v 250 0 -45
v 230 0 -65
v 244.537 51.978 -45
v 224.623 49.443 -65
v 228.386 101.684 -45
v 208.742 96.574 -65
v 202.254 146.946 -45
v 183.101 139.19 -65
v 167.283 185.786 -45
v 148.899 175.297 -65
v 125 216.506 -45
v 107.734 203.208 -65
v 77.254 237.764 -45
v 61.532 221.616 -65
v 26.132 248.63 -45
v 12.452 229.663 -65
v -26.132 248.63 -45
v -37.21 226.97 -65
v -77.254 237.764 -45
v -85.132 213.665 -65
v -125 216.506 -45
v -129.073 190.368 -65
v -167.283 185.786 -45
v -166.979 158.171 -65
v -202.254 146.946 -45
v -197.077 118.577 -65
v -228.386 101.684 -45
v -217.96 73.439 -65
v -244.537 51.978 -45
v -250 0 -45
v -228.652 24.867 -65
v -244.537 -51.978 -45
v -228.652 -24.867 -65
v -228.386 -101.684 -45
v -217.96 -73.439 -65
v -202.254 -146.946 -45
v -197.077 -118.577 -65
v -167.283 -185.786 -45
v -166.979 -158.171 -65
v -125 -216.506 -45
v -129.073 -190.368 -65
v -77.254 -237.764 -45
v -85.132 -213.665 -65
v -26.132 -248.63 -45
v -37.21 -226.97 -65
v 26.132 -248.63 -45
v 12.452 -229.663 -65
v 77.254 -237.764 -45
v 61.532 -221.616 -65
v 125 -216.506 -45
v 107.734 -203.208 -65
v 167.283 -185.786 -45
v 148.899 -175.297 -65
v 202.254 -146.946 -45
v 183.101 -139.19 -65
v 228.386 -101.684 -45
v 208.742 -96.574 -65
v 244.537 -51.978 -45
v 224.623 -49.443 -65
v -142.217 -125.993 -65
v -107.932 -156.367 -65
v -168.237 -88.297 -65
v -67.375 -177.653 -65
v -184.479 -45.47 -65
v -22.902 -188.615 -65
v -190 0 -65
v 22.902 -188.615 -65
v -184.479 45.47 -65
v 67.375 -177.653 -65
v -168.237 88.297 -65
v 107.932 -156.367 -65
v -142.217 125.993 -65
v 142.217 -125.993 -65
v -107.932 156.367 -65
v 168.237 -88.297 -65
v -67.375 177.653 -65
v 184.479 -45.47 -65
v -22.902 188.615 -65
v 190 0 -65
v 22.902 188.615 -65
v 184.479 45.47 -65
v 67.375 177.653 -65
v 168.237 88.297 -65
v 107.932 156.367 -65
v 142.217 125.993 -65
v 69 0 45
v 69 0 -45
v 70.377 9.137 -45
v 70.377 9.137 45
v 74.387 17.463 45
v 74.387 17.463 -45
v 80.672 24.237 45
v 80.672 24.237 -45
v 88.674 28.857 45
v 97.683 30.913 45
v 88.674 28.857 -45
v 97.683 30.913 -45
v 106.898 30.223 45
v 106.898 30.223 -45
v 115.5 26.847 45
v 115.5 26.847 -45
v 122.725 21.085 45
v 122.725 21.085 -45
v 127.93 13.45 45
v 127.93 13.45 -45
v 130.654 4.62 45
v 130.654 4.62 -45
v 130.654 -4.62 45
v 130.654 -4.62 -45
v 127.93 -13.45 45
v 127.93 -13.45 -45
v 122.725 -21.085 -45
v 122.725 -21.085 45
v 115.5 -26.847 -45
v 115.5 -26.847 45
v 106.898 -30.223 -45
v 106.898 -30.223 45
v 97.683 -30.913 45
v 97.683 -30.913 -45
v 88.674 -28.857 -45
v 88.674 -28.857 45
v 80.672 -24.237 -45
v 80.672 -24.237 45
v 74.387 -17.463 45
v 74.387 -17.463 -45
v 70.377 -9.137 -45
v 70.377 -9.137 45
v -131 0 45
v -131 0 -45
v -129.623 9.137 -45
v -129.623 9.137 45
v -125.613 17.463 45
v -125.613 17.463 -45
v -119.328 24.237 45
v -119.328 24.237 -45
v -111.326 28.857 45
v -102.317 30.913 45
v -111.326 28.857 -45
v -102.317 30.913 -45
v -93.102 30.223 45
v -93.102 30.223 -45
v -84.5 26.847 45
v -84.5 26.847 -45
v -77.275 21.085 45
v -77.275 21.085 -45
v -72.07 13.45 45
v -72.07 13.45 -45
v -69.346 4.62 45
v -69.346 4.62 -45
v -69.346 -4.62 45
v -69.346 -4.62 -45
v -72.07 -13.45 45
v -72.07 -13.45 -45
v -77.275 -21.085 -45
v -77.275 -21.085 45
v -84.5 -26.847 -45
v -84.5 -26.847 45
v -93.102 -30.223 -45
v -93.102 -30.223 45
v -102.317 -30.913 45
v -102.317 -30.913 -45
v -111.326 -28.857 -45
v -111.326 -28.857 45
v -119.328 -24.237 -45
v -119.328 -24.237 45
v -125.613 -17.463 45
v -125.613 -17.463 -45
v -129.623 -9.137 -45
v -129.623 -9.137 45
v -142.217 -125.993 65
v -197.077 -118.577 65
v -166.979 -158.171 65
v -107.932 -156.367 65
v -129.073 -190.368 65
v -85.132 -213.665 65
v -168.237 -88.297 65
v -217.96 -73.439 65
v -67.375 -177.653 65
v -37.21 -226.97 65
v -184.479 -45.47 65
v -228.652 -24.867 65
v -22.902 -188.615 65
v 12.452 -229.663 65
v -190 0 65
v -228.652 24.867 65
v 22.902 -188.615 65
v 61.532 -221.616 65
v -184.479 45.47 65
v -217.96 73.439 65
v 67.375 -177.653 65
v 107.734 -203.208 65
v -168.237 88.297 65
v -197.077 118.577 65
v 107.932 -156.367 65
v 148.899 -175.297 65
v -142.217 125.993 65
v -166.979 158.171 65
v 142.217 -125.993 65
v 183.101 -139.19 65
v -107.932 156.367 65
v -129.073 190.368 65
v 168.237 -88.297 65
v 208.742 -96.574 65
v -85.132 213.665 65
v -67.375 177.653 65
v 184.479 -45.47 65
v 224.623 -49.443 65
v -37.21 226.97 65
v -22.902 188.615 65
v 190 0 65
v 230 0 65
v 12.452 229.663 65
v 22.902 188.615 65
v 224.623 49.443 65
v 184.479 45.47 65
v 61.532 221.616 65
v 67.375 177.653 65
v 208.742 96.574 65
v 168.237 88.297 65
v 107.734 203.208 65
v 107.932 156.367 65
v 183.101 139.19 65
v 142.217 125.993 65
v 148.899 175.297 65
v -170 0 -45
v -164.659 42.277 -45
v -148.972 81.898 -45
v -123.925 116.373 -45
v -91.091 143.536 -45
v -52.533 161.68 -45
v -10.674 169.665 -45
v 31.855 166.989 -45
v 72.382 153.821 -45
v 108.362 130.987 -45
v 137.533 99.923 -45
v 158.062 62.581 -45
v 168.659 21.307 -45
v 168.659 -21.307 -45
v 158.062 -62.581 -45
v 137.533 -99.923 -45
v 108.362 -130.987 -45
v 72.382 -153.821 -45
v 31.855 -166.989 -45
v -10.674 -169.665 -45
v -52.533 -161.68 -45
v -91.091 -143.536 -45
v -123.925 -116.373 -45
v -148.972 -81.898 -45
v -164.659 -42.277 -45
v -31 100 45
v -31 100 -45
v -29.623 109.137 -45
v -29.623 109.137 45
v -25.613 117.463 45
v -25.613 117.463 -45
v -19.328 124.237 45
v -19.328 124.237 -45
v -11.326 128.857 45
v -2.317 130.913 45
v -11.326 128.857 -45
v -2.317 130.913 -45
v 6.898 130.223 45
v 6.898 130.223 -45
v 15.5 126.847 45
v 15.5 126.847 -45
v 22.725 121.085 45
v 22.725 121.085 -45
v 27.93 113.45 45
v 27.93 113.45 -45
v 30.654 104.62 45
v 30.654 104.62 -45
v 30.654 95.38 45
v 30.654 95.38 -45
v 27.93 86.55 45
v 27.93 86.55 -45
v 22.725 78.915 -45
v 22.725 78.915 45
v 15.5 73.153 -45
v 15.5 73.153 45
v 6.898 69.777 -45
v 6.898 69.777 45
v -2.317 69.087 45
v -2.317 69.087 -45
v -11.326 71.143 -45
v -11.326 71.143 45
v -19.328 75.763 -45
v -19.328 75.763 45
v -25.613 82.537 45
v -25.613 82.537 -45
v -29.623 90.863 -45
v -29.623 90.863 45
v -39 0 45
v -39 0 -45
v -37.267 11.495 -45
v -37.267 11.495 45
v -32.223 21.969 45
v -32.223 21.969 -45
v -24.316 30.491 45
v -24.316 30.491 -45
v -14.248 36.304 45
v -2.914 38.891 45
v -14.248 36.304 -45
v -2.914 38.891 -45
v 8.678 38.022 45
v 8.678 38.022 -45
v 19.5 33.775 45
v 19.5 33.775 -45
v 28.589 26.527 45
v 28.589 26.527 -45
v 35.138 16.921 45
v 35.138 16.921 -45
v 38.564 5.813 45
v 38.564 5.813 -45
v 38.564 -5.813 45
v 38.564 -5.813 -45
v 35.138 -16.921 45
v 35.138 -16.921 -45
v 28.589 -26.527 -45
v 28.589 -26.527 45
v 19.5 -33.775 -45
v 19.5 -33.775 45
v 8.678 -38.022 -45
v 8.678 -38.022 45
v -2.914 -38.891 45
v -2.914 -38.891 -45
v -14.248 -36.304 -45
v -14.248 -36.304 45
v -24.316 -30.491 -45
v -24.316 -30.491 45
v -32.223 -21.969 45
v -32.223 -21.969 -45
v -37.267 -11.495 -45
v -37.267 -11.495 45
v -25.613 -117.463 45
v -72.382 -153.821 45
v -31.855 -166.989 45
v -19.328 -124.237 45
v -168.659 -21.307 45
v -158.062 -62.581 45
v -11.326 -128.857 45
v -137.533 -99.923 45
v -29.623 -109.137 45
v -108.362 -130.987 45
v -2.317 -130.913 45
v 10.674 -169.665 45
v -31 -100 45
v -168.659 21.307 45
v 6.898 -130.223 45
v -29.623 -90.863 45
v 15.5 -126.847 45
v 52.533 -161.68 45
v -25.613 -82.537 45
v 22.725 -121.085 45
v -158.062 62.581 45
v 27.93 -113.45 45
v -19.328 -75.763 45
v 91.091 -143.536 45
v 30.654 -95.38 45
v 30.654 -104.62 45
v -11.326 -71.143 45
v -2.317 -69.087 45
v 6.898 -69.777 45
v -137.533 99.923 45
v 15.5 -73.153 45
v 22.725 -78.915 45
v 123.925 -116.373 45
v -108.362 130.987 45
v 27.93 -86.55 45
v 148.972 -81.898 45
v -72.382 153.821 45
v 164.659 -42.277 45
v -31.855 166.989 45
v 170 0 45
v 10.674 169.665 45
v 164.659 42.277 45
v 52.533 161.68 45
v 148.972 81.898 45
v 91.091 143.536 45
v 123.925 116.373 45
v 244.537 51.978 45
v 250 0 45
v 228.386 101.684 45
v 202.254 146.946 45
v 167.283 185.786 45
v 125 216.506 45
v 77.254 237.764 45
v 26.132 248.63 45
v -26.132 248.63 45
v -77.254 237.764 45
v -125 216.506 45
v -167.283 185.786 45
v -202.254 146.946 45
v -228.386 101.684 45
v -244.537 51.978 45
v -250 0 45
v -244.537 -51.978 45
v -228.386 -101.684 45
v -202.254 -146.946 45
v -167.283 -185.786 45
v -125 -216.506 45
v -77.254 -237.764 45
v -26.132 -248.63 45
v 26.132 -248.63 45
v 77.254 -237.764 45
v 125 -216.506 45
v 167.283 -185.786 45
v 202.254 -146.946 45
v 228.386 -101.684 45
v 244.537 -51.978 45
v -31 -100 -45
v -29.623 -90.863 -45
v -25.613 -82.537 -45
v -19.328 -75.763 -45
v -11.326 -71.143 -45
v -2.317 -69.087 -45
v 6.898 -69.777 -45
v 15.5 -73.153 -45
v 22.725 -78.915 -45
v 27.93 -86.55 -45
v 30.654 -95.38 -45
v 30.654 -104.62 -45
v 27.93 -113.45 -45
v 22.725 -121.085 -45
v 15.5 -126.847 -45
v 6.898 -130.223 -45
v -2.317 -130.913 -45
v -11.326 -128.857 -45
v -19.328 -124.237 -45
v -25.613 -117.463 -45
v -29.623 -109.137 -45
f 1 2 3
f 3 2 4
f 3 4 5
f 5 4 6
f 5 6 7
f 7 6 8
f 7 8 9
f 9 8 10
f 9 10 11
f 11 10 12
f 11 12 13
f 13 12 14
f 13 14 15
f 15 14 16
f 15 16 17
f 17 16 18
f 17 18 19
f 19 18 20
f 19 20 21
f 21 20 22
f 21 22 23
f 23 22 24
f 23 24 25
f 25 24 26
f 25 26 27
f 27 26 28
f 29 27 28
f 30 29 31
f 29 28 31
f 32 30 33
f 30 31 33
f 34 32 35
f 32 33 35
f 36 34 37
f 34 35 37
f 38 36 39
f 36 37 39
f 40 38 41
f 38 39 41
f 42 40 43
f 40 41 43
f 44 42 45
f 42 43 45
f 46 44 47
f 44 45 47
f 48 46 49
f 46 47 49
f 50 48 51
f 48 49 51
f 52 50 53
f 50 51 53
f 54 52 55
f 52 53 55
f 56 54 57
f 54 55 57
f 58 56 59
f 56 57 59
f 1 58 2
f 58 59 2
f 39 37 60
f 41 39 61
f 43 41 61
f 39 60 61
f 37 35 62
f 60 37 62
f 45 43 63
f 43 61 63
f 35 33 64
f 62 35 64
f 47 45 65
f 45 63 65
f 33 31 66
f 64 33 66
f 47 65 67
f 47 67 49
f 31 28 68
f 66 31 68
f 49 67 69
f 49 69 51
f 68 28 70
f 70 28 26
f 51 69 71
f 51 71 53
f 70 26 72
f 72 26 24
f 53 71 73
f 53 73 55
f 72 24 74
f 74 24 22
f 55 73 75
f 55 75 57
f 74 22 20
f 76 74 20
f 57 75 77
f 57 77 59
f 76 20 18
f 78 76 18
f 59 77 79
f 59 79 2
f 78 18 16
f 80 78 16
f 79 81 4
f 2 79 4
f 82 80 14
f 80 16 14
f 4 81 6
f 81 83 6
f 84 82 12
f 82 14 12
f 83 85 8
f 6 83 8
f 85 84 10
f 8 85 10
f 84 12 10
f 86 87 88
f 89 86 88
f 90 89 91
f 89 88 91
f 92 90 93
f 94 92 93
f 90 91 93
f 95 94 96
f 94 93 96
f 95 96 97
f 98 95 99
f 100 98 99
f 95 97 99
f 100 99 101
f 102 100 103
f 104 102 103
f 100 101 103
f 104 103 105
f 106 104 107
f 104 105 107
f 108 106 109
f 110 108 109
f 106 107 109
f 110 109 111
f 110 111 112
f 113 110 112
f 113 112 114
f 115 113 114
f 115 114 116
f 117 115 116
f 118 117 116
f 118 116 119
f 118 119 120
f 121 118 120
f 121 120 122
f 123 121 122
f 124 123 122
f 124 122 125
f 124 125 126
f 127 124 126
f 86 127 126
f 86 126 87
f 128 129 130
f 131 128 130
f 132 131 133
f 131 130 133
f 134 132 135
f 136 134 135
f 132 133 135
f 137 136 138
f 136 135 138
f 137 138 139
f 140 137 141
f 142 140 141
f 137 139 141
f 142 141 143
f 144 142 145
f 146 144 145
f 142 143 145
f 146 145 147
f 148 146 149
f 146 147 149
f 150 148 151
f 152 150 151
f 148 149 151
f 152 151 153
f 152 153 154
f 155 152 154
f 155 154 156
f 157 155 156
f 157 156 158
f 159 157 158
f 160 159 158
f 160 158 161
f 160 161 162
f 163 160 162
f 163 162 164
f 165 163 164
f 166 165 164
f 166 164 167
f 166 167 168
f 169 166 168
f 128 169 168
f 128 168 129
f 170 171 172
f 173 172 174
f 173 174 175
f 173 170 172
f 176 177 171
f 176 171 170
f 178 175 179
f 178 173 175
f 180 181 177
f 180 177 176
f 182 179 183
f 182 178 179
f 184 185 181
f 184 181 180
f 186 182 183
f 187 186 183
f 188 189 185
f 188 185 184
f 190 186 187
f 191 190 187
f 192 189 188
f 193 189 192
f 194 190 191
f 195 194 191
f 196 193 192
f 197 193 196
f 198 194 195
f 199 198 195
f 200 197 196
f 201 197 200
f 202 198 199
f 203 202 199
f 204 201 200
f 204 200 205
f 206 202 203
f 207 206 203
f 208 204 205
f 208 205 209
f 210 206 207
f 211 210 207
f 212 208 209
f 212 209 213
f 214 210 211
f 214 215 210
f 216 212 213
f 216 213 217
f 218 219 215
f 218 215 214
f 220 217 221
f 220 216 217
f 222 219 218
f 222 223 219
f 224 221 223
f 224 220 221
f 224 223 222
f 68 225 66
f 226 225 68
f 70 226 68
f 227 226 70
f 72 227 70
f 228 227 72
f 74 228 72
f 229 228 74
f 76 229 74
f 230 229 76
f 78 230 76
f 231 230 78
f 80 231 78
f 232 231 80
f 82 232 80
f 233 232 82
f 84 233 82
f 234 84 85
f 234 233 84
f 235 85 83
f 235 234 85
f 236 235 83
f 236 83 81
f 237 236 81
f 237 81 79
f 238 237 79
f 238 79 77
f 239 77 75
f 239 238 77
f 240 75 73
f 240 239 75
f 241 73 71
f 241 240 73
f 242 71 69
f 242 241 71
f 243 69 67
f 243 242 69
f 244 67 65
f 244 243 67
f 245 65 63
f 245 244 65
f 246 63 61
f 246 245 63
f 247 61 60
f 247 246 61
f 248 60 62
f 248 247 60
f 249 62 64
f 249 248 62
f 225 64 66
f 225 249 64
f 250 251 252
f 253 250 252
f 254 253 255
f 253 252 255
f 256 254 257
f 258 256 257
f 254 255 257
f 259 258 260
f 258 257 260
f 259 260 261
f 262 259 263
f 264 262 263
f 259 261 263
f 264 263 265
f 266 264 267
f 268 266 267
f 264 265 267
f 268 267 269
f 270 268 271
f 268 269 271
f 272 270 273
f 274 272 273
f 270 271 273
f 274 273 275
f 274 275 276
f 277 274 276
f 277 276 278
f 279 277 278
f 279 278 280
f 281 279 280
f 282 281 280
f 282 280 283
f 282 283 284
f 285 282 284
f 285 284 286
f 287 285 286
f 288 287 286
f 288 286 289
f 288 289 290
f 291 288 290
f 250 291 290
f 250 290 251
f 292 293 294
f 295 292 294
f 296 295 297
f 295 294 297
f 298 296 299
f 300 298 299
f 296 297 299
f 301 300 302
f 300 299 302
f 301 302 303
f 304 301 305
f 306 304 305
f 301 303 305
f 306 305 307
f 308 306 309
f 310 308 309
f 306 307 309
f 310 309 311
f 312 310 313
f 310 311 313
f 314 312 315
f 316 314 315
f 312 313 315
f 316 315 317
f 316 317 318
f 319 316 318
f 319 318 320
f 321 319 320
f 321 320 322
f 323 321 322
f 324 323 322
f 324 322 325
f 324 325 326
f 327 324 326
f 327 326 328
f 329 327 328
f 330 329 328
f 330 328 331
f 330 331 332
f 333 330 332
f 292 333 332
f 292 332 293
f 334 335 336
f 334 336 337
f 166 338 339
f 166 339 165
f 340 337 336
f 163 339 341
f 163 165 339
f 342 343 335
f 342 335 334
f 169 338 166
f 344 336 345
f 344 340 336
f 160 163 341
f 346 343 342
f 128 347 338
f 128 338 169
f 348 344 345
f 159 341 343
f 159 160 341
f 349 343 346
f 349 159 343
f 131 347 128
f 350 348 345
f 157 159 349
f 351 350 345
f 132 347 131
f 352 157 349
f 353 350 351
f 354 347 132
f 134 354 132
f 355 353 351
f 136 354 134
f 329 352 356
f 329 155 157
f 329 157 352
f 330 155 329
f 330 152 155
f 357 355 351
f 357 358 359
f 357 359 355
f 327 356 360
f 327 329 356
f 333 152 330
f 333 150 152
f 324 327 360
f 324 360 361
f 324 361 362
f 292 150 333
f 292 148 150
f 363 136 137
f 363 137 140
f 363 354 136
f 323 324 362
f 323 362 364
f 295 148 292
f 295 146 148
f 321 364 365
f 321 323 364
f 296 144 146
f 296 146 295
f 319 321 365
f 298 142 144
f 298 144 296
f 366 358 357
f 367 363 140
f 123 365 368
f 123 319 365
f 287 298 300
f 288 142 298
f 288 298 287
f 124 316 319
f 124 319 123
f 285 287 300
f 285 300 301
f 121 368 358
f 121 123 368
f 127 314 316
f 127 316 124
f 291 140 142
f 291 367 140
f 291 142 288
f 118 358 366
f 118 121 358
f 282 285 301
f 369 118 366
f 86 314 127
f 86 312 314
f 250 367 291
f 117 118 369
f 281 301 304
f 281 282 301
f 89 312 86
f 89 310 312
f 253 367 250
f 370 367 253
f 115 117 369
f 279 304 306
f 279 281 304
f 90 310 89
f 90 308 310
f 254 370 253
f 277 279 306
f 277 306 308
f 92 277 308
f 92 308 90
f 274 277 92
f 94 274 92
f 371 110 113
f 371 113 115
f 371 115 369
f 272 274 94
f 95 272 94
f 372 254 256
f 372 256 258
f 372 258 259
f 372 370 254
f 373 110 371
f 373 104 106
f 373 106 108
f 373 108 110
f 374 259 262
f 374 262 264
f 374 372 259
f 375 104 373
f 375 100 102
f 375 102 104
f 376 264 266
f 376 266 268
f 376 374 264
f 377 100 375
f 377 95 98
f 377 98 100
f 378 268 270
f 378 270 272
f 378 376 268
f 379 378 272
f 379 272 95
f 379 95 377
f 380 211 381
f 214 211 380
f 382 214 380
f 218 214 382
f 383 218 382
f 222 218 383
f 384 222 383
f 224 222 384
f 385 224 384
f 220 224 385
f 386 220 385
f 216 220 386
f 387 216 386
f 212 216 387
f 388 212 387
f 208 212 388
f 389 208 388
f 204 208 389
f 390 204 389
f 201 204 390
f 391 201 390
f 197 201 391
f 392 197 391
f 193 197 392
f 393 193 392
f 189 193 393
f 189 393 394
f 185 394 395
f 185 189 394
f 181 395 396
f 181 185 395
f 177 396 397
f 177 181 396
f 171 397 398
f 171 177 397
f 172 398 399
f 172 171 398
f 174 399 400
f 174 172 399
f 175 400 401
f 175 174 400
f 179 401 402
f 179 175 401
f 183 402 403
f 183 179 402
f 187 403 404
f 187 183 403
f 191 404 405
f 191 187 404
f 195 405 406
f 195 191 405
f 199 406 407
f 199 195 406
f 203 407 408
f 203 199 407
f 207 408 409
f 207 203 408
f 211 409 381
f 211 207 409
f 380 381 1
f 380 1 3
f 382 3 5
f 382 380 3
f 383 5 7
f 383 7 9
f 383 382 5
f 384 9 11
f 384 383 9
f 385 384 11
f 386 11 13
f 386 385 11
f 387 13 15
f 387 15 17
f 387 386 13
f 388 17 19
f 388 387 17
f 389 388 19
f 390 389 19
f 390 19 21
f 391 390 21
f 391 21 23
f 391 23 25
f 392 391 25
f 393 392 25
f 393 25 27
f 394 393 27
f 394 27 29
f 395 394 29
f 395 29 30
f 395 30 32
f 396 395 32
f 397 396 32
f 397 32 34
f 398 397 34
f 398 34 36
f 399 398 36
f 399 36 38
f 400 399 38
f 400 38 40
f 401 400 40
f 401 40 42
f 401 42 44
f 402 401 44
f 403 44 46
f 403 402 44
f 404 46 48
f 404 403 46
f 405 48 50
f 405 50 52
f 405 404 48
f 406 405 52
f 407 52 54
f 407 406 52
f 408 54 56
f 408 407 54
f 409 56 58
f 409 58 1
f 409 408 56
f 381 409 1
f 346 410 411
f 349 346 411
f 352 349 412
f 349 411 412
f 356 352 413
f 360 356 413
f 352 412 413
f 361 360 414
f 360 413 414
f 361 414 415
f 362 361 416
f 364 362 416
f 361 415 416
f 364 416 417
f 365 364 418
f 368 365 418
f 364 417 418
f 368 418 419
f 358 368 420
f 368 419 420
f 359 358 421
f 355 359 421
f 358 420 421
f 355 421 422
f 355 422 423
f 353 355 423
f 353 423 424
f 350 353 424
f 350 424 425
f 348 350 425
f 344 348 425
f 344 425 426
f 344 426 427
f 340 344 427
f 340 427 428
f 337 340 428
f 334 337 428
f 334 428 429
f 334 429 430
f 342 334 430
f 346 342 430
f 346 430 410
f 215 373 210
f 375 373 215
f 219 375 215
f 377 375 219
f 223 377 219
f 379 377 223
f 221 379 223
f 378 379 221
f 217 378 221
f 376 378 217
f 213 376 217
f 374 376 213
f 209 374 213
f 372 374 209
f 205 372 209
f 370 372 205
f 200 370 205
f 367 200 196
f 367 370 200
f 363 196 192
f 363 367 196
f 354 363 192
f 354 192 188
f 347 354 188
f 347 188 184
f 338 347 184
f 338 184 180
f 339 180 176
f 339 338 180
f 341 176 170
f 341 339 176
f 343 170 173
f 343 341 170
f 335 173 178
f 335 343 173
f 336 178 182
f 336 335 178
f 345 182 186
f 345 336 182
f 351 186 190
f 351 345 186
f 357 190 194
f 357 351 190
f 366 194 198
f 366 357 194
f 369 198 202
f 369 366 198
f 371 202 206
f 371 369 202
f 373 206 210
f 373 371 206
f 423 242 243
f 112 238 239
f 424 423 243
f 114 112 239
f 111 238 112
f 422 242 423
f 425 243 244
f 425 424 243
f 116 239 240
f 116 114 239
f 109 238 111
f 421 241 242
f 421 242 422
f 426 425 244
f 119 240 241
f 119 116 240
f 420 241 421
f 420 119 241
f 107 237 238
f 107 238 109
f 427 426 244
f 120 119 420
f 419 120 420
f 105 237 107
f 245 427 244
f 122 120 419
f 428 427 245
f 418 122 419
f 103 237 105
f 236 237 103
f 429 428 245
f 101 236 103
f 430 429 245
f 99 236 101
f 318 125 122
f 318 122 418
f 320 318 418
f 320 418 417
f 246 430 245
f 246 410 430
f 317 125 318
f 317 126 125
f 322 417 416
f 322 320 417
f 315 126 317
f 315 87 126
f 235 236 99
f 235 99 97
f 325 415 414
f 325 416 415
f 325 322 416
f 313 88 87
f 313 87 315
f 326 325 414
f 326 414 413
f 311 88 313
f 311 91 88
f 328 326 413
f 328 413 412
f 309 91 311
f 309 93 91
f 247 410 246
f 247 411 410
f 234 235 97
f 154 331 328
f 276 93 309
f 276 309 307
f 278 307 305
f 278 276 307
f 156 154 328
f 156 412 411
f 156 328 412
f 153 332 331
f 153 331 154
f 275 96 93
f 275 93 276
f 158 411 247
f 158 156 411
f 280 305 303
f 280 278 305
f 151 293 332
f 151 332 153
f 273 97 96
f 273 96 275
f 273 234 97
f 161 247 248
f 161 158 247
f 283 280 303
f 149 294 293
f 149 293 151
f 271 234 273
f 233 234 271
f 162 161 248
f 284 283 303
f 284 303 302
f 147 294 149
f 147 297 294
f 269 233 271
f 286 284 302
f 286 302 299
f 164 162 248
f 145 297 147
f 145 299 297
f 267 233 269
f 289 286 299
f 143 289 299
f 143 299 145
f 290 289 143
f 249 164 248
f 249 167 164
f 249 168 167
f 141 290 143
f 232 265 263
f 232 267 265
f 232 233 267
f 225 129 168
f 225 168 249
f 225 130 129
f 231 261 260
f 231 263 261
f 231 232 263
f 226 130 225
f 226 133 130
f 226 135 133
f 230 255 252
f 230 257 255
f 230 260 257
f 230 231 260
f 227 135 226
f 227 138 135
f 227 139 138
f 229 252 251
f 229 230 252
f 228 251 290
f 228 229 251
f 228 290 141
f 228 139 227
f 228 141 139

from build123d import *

# Parameters (mm, degrees)
SKETCH1_R           = 250
BOSS_EXTRUDE1_DEPTH = 65
CHAMFER1_SIZE       = 20
SKETCH2_R           = 190
CUT_EXTRUDE1_DEPTH  = 20
CUT_EXTRUDE1_TAPER  = 45
SKETCH3_R           = 190
CUT_EXTRUDE2_DEPTH  = 20
CUT_EXTRUDE2_TAPER  = 45
SKETCH4_R           = 31
SKETCH4_R_2         = 39
CUT_EXTRUDE3_DEPTH  = 111.0000001


with BuildPart() as part:
    # Sketch1 → Boss-Extrude1 (new body, symmetric)
    with BuildSketch(Plane.XY):
        Circle(SKETCH1_R)
    extrude(amount=BOSS_EXTRUDE1_DEPTH, both=True)

    # Chamfer1
    chamfer1_edges = [part.edges().sort_by_distance(p)[0] for p in [
        (-250, 0, -65),
        (-250, 0, 65),
    ]]
    chamfer(chamfer1_edges, length=CHAMFER1_SIZE)

    # Sketch2 → Cut-Extrude1 (cut)
    with BuildSketch(Plane.XY.offset(65)):
        Circle(SKETCH2_R)
    extrude(amount=-CUT_EXTRUDE1_DEPTH, taper=CUT_EXTRUDE1_TAPER, mode=Mode.SUBTRACT)

    # Sketch3 → Cut-Extrude2 (cut)
    with BuildSketch(Plane(origin=(0, 0, -65), x_dir=(-1, 0, 0), z_dir=(0, 0, -1))):
        Circle(SKETCH3_R)
    extrude(amount=-CUT_EXTRUDE2_DEPTH, taper=CUT_EXTRUDE2_TAPER, mode=Mode.SUBTRACT)

    # Sketch4 → Cut-Extrude3 (cut, through all)
    with BuildSketch(Plane(origin=(0, 0, -45), x_dir=(-1, 0, 0), z_dir=(0, 0, -1))):
        with Locations((0, 100)):
            Circle(SKETCH4_R)
        with Locations((-100, 0)):
            Circle(SKETCH4_R)
        with Locations((0, -100)):
            Circle(SKETCH4_R)
        with Locations((100, 0)):
            Circle(SKETCH4_R)
        Circle(SKETCH4_R_2)
    extrude(amount=-CUT_EXTRUDE3_DEPTH, mode=Mode.SUBTRACT)


solid = part.part
